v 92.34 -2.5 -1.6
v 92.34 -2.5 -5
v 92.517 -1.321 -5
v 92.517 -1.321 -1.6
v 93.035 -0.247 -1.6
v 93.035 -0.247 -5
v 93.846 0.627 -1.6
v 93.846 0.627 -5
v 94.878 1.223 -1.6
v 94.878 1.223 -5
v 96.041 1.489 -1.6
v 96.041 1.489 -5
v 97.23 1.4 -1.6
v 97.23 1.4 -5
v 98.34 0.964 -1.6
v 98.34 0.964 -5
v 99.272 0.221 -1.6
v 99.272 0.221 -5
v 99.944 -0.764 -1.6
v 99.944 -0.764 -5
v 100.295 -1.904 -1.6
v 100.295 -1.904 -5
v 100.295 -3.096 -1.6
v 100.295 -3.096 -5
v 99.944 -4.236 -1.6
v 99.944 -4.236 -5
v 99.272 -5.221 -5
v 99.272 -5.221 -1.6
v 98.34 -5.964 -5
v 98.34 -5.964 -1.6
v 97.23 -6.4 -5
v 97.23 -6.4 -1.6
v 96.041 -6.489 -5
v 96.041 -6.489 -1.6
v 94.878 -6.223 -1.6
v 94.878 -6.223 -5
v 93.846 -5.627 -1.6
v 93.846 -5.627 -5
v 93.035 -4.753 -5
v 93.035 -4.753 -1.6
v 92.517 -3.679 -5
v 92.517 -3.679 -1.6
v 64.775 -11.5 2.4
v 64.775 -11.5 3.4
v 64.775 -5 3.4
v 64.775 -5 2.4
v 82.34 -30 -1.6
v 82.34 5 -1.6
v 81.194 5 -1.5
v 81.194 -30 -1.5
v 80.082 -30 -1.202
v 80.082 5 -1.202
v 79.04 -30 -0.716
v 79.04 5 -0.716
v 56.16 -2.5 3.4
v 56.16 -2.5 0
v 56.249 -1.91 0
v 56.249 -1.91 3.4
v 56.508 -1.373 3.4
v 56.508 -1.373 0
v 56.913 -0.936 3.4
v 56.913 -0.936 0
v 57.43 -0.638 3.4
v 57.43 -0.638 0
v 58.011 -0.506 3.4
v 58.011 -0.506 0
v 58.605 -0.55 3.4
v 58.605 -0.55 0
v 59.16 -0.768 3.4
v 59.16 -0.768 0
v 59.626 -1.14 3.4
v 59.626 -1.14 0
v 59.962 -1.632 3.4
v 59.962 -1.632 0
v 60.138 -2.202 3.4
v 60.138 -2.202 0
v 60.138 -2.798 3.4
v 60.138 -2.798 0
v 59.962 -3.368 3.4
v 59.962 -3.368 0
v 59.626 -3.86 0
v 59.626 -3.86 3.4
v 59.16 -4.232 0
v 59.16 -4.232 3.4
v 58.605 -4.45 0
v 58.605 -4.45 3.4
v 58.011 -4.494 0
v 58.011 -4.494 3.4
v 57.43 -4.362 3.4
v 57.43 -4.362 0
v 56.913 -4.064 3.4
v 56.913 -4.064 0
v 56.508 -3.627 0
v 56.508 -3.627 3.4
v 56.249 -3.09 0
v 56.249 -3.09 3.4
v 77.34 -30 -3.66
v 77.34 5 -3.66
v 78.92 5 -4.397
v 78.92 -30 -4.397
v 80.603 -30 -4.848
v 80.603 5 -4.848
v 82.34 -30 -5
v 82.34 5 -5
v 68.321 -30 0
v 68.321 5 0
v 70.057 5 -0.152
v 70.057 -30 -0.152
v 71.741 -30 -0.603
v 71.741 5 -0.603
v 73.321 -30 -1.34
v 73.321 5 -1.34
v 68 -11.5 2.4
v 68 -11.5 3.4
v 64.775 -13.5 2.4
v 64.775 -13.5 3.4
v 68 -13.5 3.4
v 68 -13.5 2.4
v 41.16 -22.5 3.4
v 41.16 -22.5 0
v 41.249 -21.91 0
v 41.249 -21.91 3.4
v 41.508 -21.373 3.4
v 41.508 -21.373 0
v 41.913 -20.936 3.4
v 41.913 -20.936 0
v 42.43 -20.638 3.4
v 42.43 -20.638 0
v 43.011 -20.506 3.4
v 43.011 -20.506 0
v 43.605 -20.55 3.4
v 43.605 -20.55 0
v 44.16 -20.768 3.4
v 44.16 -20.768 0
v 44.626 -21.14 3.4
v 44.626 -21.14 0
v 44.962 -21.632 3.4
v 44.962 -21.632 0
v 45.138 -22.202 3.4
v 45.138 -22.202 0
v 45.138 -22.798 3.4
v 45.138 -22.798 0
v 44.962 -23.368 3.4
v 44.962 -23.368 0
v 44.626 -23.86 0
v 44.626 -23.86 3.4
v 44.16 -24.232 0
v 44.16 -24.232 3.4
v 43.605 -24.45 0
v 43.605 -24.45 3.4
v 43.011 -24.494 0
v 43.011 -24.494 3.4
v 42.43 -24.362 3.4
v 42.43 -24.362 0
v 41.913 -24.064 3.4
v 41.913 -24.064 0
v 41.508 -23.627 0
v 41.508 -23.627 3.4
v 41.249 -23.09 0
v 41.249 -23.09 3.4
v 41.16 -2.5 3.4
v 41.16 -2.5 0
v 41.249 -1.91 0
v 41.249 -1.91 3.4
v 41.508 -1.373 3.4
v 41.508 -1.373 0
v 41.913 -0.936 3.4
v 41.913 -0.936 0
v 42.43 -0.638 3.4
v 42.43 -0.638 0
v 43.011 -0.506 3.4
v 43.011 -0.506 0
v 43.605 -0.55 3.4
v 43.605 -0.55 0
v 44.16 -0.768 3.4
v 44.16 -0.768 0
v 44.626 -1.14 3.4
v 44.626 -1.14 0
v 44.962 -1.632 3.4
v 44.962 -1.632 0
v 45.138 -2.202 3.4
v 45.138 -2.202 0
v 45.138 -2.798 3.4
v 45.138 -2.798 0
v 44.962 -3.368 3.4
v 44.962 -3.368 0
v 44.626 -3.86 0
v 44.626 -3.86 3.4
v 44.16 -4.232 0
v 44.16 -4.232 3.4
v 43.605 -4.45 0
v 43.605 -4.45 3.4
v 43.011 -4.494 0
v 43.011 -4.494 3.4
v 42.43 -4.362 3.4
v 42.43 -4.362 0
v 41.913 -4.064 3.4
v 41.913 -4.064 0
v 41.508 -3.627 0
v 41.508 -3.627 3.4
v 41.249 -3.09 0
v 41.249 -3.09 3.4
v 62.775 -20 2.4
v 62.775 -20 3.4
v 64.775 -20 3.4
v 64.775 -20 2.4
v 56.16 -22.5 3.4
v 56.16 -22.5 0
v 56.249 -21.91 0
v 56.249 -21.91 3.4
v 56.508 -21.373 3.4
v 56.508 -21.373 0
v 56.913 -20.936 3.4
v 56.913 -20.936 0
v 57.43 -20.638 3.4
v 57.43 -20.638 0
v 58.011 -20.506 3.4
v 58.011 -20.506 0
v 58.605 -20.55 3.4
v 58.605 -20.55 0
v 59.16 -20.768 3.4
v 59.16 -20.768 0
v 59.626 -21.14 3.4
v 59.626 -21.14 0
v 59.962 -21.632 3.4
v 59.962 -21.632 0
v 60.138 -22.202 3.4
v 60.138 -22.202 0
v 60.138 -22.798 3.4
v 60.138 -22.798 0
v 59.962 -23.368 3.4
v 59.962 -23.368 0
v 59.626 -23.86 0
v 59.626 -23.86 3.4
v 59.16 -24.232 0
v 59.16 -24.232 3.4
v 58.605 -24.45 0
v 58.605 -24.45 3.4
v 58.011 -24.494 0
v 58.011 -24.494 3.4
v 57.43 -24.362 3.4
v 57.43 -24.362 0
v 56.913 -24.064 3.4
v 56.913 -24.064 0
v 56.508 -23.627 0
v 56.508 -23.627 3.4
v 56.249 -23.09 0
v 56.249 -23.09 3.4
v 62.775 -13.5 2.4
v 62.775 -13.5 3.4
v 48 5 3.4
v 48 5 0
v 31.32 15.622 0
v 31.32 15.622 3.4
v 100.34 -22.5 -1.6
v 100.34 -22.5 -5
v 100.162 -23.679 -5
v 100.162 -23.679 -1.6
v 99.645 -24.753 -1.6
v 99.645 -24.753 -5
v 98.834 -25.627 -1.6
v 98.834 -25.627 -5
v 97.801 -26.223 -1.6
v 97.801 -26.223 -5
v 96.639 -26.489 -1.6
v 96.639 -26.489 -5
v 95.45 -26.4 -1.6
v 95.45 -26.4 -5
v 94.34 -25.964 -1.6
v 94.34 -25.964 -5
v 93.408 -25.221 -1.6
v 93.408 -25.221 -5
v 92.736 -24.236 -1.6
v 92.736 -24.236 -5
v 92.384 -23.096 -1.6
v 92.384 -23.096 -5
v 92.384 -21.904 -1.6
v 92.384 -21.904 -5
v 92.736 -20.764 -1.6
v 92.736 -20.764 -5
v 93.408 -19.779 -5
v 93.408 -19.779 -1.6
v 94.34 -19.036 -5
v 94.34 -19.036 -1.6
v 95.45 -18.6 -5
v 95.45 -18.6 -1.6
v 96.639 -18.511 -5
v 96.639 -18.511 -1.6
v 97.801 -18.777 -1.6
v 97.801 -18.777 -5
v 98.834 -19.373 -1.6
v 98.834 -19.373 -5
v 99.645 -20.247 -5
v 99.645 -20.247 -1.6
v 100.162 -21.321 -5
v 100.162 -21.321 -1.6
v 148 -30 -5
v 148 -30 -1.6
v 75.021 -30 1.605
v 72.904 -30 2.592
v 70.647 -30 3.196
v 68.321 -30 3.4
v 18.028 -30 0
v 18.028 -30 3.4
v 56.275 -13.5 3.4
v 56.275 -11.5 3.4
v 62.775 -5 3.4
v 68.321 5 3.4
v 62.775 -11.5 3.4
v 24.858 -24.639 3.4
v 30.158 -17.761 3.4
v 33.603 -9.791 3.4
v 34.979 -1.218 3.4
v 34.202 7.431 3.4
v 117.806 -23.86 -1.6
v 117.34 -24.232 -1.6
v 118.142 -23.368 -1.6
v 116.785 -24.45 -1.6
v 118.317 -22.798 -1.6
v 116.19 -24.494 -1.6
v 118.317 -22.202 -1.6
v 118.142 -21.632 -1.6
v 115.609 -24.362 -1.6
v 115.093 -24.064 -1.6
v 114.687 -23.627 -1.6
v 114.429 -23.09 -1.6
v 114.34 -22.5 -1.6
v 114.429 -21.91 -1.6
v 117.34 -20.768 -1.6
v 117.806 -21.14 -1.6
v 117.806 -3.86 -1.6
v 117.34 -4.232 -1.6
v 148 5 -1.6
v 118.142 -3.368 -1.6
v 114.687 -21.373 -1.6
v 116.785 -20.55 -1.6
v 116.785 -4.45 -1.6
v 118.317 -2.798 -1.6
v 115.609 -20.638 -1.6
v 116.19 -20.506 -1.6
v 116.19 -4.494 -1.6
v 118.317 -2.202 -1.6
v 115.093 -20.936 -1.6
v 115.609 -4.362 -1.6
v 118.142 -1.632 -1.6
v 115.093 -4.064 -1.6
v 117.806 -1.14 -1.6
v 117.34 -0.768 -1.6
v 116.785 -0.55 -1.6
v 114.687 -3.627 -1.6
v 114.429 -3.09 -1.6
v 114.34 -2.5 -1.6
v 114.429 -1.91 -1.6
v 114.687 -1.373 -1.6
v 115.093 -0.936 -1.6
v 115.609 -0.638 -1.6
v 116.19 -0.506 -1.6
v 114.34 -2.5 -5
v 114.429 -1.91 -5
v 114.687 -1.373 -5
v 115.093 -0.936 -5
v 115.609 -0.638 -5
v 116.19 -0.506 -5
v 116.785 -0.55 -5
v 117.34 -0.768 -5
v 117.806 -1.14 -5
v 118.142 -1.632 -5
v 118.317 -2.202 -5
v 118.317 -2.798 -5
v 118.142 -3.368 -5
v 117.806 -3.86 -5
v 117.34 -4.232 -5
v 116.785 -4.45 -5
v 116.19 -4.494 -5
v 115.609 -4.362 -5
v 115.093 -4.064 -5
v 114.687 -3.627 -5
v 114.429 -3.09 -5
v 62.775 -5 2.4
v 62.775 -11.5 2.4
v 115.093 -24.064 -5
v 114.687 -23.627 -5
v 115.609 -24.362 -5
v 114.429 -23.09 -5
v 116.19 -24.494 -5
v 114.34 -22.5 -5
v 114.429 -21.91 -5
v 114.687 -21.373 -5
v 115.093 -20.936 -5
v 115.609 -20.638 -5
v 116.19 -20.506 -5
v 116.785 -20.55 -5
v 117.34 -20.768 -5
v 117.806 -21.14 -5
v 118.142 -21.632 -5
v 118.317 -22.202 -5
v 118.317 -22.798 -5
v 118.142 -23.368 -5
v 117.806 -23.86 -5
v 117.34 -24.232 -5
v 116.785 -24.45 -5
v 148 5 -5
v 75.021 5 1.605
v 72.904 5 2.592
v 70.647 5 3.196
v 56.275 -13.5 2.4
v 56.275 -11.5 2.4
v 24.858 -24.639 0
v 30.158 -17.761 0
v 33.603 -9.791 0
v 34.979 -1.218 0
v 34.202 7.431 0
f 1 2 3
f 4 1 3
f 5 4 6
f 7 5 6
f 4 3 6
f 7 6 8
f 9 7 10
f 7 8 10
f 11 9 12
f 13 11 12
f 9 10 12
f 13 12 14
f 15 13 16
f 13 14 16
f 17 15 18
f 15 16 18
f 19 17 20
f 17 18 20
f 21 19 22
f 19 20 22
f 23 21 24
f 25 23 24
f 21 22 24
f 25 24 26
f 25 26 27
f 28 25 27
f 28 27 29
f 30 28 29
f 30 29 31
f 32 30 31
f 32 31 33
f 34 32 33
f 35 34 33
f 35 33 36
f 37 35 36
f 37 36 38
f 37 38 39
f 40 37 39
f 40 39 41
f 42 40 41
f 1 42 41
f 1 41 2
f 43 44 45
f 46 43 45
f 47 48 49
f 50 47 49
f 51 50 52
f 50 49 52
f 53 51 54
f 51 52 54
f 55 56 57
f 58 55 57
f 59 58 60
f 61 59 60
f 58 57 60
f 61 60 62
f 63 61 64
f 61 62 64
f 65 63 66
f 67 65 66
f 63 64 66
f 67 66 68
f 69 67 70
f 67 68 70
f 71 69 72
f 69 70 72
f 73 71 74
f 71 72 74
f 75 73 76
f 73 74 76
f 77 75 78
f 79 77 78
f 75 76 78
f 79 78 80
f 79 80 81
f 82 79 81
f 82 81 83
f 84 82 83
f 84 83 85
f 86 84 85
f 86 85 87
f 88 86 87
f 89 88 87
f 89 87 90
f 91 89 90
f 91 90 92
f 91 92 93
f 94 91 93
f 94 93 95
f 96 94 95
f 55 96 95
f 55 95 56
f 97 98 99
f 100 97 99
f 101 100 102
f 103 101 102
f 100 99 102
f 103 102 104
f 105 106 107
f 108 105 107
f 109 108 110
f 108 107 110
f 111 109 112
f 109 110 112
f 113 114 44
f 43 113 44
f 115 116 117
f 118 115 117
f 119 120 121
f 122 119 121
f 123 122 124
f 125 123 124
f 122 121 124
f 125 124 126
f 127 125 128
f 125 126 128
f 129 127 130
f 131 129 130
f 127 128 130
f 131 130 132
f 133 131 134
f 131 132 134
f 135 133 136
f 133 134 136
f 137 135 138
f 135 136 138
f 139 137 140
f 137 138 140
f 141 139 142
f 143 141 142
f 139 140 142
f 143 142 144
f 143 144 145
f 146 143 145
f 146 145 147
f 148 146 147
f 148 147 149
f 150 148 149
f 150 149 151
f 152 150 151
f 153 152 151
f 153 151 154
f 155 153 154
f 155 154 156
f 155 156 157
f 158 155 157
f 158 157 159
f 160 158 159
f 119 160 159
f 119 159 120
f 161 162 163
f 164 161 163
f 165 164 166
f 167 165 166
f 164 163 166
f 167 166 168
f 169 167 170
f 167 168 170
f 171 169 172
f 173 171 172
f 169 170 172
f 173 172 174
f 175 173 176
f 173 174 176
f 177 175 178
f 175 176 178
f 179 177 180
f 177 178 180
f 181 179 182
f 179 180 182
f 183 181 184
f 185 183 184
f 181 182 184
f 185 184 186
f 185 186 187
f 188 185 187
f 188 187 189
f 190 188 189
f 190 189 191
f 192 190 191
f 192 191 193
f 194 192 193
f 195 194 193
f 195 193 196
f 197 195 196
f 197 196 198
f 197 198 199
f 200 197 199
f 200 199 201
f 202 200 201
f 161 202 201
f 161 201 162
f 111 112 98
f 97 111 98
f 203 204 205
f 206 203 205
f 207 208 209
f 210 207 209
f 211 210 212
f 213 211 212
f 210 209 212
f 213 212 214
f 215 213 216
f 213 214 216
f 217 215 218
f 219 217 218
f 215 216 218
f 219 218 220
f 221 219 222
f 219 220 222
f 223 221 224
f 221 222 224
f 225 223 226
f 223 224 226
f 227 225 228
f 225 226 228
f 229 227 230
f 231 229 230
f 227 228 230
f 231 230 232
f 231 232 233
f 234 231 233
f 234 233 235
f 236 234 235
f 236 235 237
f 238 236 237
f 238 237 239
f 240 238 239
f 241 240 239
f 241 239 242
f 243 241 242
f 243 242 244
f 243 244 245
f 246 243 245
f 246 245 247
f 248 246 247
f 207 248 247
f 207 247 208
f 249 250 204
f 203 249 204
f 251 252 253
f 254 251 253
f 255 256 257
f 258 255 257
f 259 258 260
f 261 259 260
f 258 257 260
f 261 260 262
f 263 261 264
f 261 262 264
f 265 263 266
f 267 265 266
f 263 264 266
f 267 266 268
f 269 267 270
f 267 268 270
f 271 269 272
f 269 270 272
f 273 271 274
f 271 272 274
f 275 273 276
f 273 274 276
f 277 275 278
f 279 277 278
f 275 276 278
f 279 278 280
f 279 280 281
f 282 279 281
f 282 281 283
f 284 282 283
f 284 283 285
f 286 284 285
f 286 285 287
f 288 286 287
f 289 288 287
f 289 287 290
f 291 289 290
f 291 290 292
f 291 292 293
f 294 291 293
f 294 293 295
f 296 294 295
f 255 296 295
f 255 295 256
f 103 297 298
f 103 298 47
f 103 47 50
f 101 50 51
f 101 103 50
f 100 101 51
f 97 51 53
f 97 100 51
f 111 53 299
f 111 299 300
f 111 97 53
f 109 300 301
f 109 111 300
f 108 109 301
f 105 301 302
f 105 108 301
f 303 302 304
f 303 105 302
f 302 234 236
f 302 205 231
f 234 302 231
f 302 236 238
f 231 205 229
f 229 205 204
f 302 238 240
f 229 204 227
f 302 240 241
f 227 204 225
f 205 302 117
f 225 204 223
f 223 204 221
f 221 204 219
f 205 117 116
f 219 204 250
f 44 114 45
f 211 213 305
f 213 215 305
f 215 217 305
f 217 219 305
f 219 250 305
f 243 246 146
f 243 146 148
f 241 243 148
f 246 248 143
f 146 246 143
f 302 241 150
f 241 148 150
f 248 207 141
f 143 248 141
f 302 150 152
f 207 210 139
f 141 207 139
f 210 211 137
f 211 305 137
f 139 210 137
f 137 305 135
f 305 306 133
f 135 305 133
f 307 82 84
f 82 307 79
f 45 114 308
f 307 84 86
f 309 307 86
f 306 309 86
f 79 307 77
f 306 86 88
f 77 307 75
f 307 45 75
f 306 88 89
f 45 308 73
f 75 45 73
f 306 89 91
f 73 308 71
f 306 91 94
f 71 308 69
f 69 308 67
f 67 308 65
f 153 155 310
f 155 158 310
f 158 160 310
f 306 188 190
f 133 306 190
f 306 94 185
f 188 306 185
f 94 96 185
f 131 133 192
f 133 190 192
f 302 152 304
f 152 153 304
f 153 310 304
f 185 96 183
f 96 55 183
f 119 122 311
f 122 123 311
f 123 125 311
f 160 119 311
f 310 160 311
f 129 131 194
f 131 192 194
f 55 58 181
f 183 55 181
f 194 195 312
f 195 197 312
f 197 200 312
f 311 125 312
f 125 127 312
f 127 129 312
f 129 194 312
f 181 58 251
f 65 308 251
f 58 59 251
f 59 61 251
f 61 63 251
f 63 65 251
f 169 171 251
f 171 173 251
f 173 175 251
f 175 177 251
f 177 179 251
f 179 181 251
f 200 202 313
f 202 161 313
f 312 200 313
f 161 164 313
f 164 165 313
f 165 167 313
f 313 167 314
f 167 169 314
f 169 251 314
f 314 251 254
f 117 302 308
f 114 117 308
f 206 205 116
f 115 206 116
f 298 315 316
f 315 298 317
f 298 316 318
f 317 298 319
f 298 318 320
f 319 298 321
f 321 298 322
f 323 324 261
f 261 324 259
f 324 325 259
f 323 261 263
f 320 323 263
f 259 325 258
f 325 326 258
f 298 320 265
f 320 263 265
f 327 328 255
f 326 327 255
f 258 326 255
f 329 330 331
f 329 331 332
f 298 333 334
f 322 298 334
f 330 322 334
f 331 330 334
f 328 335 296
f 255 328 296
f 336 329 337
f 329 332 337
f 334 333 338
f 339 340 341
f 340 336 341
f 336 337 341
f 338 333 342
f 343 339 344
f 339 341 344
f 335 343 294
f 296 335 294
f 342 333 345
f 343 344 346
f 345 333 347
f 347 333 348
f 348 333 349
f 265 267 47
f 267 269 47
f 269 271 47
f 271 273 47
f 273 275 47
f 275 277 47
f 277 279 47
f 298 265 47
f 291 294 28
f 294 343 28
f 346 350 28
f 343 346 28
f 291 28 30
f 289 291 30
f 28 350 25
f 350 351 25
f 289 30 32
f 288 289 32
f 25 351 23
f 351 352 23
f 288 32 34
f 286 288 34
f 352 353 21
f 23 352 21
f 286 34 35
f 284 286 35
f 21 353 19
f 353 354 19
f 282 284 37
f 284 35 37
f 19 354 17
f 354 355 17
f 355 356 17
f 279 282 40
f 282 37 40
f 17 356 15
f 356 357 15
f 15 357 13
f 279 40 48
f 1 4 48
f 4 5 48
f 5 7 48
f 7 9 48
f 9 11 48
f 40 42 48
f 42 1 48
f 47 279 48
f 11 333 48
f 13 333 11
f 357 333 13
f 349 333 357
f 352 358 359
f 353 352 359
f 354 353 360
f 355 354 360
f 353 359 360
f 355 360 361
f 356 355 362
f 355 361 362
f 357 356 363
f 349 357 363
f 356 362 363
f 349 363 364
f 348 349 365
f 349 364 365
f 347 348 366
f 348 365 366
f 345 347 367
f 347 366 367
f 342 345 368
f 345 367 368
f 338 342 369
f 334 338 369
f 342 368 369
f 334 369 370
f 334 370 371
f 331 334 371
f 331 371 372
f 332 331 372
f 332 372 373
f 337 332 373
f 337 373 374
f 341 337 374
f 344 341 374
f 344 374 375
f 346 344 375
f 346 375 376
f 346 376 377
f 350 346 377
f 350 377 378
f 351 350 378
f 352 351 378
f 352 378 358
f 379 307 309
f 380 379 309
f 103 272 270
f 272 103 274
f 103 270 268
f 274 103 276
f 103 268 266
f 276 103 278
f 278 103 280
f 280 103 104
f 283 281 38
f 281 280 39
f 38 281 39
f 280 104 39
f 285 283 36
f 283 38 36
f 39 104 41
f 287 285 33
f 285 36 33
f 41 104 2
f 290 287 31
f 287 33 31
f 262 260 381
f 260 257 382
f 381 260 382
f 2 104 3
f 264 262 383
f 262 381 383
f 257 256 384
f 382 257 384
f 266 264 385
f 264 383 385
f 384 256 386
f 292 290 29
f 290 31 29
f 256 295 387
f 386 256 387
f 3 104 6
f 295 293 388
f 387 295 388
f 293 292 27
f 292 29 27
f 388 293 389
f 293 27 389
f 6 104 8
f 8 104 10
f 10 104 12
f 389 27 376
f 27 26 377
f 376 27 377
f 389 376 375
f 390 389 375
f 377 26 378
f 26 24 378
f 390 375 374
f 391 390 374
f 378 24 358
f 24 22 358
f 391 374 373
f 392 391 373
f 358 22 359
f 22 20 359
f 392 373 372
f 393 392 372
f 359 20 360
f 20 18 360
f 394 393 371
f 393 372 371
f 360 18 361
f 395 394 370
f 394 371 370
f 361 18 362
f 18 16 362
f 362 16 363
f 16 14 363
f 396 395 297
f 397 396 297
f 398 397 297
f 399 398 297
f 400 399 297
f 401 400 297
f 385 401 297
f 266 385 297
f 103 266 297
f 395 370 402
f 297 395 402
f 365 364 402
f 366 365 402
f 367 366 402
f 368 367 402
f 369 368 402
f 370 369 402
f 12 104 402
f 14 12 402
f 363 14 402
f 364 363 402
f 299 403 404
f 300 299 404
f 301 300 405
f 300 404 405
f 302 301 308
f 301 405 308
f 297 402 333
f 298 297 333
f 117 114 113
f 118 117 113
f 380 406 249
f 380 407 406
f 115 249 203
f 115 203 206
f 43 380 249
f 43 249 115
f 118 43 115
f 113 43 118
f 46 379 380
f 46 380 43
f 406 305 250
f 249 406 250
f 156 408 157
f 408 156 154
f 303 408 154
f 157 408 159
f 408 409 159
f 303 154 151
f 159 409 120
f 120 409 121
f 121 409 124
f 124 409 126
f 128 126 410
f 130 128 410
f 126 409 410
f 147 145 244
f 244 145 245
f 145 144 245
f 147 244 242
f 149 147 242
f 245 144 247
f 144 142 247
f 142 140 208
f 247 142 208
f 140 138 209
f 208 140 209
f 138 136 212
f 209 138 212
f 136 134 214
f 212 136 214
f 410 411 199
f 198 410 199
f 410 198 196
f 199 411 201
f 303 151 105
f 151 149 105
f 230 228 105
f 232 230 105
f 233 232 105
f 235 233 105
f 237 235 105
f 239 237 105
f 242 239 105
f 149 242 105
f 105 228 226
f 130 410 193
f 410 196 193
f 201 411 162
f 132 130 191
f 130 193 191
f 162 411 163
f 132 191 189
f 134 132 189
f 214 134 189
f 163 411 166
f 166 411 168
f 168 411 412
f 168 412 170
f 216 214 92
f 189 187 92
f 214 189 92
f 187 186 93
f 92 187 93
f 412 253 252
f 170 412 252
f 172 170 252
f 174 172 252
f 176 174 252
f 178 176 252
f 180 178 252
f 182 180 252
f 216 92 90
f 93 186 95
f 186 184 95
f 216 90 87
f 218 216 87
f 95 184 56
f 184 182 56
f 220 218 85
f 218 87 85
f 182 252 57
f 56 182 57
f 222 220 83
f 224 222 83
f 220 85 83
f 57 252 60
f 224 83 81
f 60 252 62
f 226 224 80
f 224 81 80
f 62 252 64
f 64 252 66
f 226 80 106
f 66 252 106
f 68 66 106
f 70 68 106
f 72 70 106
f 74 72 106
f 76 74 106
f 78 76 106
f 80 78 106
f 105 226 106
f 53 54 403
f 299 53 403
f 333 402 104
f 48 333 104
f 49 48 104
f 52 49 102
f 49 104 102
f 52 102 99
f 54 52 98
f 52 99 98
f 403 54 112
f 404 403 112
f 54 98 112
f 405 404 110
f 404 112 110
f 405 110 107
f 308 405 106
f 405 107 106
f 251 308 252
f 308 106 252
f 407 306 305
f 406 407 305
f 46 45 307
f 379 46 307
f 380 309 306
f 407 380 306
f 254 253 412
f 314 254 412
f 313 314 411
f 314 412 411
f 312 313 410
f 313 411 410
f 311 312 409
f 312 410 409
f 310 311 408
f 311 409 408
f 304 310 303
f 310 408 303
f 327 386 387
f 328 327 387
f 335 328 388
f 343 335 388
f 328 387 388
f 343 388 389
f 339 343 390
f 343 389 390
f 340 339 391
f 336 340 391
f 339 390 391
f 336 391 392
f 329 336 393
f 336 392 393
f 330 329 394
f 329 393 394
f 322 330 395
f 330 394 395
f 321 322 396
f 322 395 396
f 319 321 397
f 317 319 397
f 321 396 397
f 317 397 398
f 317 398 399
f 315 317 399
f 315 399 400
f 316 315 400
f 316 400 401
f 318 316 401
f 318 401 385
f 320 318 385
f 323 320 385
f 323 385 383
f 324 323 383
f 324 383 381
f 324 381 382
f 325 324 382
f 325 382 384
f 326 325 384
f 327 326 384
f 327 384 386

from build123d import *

# Parameters (mm, degrees)
BOSS_EXTRUDE1_DEPTH = 3.4
SKETCH3_R           = 5
CUT_EXTRUDE1_DEPTH  = 6
CUT_EXTRUDE2_DEPTH  = 10
SKETCH6_R           = 35
CUT_EXTRUDE3_DEPTH  = 10
CUT_EXTRUDE4_DEPTH  = 1
CUT_EXTRUDE5_REACH  = 87.508
SKETCH8_W           = 12
SKETCH8_H           = 35
BOSS_EXTRUDE2_DEPTH = 35
SKETCH10_R          = 4
CUT_EXTRUDE6_DEPTH  = 10
CUT_EXTRUDE7_REACH  = 153.093
SKETCH11_R          = 2
CUT_EXTRUDE8_REACH  = 153.243
SKETCH12_R          = 2


with BuildPart() as part:
    # Sketch1 → Boss-Extrude1 (new body)
    with BuildSketch(Plane.XY):
        with BuildLine():
            Line((0, -30), (80, -30))
            Line((80, -30), (80, 5))
            Line((80, 5), (48, 5))
            Line((48, 5), (16.114075804, 25.304872277))
            ThreePointArc((16.114075804, 25.304872277), (-28.802310396, 8.392074585), (0, -30))
        make_face()
    extrude(amount=BOSS_EXTRUDE1_DEPTH)

    # Sketch3 → Cut-Extrude1 (cut)
    with BuildSketch(Plane.XY.offset(3.4)):
        Circle(SKETCH3_R)
    extrude(amount=-CUT_EXTRUDE1_DEPTH, mode=Mode.SUBTRACT)

    # Sketch5 → Cut-Extrude2 (cut)
    with BuildSketch(Plane.XY.offset(3.4)):
        with BuildLine():
            ThreePointArc((0, 10), (-8.660254038, 5), (-8.660254038, -5))
            ThreePointArc((-8.660254038, -5), (-10.124355653, -10.464101615), (-15.588457268, -9))
            ThreePointArc((-15.588457268, -9), (-15.588457268, 9), (0, 18))
            ThreePointArc((0, 18), (4, 14), (0, 10))
        make_face()
    extrude(amount=-CUT_EXTRUDE2_DEPTH, mode=Mode.SUBTRACT)

    # Sketch6 → Cut-Extrude3 (cut)
    with BuildSketch(Plane(origin=(0, 0, 0), x_dir=(-1, 0, 0), z_dir=(0, 0, -1))):
        Circle(SKETCH6_R)
    extrude(amount=-CUT_EXTRUDE3_DEPTH, mode=Mode.SUBTRACT)

    # Sketch7 → Cut-Extrude4 (cut)
    with BuildSketch(Plane.XY.offset(3.4)):
        Polygon((62.77538264, -13.5), (62.77538264, -20), (64.77538264, -20), (64.77538264, -13.5), (71.27538264, -13.5), (71.27538264, -11.5), (64.77538264, -11.5), (64.77538264, -5), (62.77538264, -5), (62.77538264, -11.5), (56.27538264, -11.5), (56.27538264, -13.5), align=None)
    extrude(amount=-CUT_EXTRUDE4_DEPTH, mode=Mode.SUBTRACT)

    # Sketch8 → Cut-Extrude5 (cut, up to next)
    with BuildSketch(Plane(origin=(0, 0, 0), x_dir=(-1, 0, 0), z_dir=(0, 0, -1)), mode=Mode.PRIVATE) as cut_extrude5_sk1:
        with Locations((-74, -12.5)):
            Rectangle(SKETCH8_W, SKETCH8_H)
    cut_extrude5_tool1 = extrude(cut_extrude5_sk1.sketch, amount=-CUT_EXTRUDE5_REACH, mode=Mode.PRIVATE) & part.part
    add(cut_extrude5_tool1.solids().sort_by_distance((74, -12.5, 0))[0], mode=Mode.SUBTRACT)

    # Sketch9 → Boss-Extrude2 (add)
    with BuildSketch(Plane(origin=(0, 5, 0), x_dir=(1, 0, 0), z_dir=(0, 1, 0))):
        with BuildLine():
            Line((68, 0), (68.320508076, 0))
            ThreePointArc((68.320508076, 0), (70.908698527, 0.340741737), (73.320508076, 1.339745962))
            Line((73.320508076, 1.339745962), (77.339745962, 3.660254038))
            ThreePointArc((77.339745962, 3.660254038), (79.751555511, 4.659258263), (82.339745962, 5))
            Line((82.339745962, 5), (83, 5))
            Line((83, 5), (148, 5))
            Line((148, 5), (148, 1.6))
            Line((148, 1.6), (83, 1.6))
            Line((83, 1.6), (82.339745962, 1.6))
            ThreePointArc((82.339745962, 1.6), (80.631540264, 1.375110454), (79.039745962, 0.715767665))
            Line((79.039745962, 0.715767665), (75.020508076, -1.604740411))
            ThreePointArc((75.020508076, -1.604740411), (71.78868328, -2.943406072), (68.320508076, -3.4))
            Line((68.320508076, -3.4), (68, -3.4))
            Line((68, -3.4), (68, 0))
        make_face()
    extrude(amount=-BOSS_EXTRUDE2_DEPTH)

    # Sketch10 → Cut-Extrude6 (cut)
    with BuildSketch(Plane(origin=(0, 0, -5), x_dir=(-1, 0, 0), z_dir=(0, 0, -1))):
        with Locations((-96.339745962, -2.5)):
            Circle(SKETCH10_R)
        with Locations(Location((-96.339745962, -22.5, 0), (0, 0, 180))):
            Circle(SKETCH10_R)
    extrude(amount=-CUT_EXTRUDE6_DEPTH, mode=Mode.SUBTRACT)

    # Sketch11 → Cut-Extrude7 (cut, up to next)
    with BuildSketch(Plane(origin=(0, 0, 0), x_dir=(-1, 0, 0), z_dir=(0, 0, -1)), mode=Mode.PRIVATE) as cut_extrude7_sk1:
        with Locations((-58.160254038, -22.5)):
            Circle(SKETCH11_R)
    cut_extrude7_tool1 = extrude(cut_extrude7_sk1.sketch, amount=-CUT_EXTRUDE7_REACH, mode=Mode.PRIVATE) & part.part
    # Sketch11 → Cut-Extrude7 (cut, up to next)
    with BuildSketch(Plane(origin=(0, 0, 0), x_dir=(-1, 0, 0), z_dir=(0, 0, -1)), mode=Mode.PRIVATE) as cut_extrude7_sk2:
        with Locations((-58.160254038, -2.5)):
            Circle(SKETCH11_R)
    cut_extrude7_tool2 = extrude(cut_extrude7_sk2.sketch, amount=-CUT_EXTRUDE7_REACH, mode=Mode.PRIVATE) & part.part
    # Sketch11 → Cut-Extrude7 (cut, up to next)
    with BuildSketch(Plane(origin=(0, 0, 0), x_dir=(-1, 0, 0), z_dir=(0, 0, -1)), mode=Mode.PRIVATE) as cut_extrude7_sk3:
        with Locations((-43.160254038, -22.5)):
            Circle(SKETCH11_R)
    cut_extrude7_tool3 = extrude(cut_extrude7_sk3.sketch, amount=-CUT_EXTRUDE7_REACH, mode=Mode.PRIVATE) & part.part
    # Sketch11 → Cut-Extrude7 (cut, up to next)
    with BuildSketch(Plane(origin=(0, 0, 0), x_dir=(-1, 0, 0), z_dir=(0, 0, -1)), mode=Mode.PRIVATE) as cut_extrude7_sk4:
        with Locations((-43.160254038, -2.5)):
            Circle(SKETCH11_R)
    cut_extrude7_tool4 = extrude(cut_extrude7_sk4.sketch, amount=-CUT_EXTRUDE7_REACH, mode=Mode.PRIVATE) & part.part
    add(cut_extrude7_tool1.solids().sort_by_distance((58.160254, -22.5, 0))[0], mode=Mode.SUBTRACT)
    add(cut_extrude7_tool2.solids().sort_by_distance((58.160254, -2.5, 0))[0], mode=Mode.SUBTRACT)
    add(cut_extrude7_tool3.solids().sort_by_distance((43.160254, -22.5, 0))[0], mode=Mode.SUBTRACT)
    add(cut_extrude7_tool4.solids().sort_by_distance((43.160254, -2.5, 0))[0], mode=Mode.SUBTRACT)

    # Sketch12 → Cut-Extrude8 (cut, up to next)
    with BuildSketch(Plane(origin=(0, 0, -5), x_dir=(-1, 0, 0), z_dir=(0, 0, -1)), mode=Mode.PRIVATE) as cut_extrude8_sk1:
        with Locations((-116.339745962, -22.5)):
            Circle(SKETCH12_R)
    cut_extrude8_tool1 = extrude(cut_extrude8_sk1.sketch, amount=-CUT_EXTRUDE8_REACH, mode=Mode.PRIVATE) & part.part
    # Sketch12 → Cut-Extrude8 (cut, up to next)
    with BuildSketch(Plane(origin=(0, 0, -5), x_dir=(-1, 0, 0), z_dir=(0, 0, -1)), mode=Mode.PRIVATE) as cut_extrude8_sk2:
        with Locations((-116.339745962, -2.5)):
            Circle(SKETCH12_R)
    cut_extrude8_tool2 = extrude(cut_extrude8_sk2.sketch, amount=-CUT_EXTRUDE8_REACH, mode=Mode.PRIVATE) & part.part
    add(cut_extrude8_tool1.solids().sort_by_distance((116.339746, -22.5, -5))[0], mode=Mode.SUBTRACT)
    add(cut_extrude8_tool2.solids().sort_by_distance((116.339746, -2.5, -5))[0], mode=Mode.SUBTRACT)


solid = part.part
